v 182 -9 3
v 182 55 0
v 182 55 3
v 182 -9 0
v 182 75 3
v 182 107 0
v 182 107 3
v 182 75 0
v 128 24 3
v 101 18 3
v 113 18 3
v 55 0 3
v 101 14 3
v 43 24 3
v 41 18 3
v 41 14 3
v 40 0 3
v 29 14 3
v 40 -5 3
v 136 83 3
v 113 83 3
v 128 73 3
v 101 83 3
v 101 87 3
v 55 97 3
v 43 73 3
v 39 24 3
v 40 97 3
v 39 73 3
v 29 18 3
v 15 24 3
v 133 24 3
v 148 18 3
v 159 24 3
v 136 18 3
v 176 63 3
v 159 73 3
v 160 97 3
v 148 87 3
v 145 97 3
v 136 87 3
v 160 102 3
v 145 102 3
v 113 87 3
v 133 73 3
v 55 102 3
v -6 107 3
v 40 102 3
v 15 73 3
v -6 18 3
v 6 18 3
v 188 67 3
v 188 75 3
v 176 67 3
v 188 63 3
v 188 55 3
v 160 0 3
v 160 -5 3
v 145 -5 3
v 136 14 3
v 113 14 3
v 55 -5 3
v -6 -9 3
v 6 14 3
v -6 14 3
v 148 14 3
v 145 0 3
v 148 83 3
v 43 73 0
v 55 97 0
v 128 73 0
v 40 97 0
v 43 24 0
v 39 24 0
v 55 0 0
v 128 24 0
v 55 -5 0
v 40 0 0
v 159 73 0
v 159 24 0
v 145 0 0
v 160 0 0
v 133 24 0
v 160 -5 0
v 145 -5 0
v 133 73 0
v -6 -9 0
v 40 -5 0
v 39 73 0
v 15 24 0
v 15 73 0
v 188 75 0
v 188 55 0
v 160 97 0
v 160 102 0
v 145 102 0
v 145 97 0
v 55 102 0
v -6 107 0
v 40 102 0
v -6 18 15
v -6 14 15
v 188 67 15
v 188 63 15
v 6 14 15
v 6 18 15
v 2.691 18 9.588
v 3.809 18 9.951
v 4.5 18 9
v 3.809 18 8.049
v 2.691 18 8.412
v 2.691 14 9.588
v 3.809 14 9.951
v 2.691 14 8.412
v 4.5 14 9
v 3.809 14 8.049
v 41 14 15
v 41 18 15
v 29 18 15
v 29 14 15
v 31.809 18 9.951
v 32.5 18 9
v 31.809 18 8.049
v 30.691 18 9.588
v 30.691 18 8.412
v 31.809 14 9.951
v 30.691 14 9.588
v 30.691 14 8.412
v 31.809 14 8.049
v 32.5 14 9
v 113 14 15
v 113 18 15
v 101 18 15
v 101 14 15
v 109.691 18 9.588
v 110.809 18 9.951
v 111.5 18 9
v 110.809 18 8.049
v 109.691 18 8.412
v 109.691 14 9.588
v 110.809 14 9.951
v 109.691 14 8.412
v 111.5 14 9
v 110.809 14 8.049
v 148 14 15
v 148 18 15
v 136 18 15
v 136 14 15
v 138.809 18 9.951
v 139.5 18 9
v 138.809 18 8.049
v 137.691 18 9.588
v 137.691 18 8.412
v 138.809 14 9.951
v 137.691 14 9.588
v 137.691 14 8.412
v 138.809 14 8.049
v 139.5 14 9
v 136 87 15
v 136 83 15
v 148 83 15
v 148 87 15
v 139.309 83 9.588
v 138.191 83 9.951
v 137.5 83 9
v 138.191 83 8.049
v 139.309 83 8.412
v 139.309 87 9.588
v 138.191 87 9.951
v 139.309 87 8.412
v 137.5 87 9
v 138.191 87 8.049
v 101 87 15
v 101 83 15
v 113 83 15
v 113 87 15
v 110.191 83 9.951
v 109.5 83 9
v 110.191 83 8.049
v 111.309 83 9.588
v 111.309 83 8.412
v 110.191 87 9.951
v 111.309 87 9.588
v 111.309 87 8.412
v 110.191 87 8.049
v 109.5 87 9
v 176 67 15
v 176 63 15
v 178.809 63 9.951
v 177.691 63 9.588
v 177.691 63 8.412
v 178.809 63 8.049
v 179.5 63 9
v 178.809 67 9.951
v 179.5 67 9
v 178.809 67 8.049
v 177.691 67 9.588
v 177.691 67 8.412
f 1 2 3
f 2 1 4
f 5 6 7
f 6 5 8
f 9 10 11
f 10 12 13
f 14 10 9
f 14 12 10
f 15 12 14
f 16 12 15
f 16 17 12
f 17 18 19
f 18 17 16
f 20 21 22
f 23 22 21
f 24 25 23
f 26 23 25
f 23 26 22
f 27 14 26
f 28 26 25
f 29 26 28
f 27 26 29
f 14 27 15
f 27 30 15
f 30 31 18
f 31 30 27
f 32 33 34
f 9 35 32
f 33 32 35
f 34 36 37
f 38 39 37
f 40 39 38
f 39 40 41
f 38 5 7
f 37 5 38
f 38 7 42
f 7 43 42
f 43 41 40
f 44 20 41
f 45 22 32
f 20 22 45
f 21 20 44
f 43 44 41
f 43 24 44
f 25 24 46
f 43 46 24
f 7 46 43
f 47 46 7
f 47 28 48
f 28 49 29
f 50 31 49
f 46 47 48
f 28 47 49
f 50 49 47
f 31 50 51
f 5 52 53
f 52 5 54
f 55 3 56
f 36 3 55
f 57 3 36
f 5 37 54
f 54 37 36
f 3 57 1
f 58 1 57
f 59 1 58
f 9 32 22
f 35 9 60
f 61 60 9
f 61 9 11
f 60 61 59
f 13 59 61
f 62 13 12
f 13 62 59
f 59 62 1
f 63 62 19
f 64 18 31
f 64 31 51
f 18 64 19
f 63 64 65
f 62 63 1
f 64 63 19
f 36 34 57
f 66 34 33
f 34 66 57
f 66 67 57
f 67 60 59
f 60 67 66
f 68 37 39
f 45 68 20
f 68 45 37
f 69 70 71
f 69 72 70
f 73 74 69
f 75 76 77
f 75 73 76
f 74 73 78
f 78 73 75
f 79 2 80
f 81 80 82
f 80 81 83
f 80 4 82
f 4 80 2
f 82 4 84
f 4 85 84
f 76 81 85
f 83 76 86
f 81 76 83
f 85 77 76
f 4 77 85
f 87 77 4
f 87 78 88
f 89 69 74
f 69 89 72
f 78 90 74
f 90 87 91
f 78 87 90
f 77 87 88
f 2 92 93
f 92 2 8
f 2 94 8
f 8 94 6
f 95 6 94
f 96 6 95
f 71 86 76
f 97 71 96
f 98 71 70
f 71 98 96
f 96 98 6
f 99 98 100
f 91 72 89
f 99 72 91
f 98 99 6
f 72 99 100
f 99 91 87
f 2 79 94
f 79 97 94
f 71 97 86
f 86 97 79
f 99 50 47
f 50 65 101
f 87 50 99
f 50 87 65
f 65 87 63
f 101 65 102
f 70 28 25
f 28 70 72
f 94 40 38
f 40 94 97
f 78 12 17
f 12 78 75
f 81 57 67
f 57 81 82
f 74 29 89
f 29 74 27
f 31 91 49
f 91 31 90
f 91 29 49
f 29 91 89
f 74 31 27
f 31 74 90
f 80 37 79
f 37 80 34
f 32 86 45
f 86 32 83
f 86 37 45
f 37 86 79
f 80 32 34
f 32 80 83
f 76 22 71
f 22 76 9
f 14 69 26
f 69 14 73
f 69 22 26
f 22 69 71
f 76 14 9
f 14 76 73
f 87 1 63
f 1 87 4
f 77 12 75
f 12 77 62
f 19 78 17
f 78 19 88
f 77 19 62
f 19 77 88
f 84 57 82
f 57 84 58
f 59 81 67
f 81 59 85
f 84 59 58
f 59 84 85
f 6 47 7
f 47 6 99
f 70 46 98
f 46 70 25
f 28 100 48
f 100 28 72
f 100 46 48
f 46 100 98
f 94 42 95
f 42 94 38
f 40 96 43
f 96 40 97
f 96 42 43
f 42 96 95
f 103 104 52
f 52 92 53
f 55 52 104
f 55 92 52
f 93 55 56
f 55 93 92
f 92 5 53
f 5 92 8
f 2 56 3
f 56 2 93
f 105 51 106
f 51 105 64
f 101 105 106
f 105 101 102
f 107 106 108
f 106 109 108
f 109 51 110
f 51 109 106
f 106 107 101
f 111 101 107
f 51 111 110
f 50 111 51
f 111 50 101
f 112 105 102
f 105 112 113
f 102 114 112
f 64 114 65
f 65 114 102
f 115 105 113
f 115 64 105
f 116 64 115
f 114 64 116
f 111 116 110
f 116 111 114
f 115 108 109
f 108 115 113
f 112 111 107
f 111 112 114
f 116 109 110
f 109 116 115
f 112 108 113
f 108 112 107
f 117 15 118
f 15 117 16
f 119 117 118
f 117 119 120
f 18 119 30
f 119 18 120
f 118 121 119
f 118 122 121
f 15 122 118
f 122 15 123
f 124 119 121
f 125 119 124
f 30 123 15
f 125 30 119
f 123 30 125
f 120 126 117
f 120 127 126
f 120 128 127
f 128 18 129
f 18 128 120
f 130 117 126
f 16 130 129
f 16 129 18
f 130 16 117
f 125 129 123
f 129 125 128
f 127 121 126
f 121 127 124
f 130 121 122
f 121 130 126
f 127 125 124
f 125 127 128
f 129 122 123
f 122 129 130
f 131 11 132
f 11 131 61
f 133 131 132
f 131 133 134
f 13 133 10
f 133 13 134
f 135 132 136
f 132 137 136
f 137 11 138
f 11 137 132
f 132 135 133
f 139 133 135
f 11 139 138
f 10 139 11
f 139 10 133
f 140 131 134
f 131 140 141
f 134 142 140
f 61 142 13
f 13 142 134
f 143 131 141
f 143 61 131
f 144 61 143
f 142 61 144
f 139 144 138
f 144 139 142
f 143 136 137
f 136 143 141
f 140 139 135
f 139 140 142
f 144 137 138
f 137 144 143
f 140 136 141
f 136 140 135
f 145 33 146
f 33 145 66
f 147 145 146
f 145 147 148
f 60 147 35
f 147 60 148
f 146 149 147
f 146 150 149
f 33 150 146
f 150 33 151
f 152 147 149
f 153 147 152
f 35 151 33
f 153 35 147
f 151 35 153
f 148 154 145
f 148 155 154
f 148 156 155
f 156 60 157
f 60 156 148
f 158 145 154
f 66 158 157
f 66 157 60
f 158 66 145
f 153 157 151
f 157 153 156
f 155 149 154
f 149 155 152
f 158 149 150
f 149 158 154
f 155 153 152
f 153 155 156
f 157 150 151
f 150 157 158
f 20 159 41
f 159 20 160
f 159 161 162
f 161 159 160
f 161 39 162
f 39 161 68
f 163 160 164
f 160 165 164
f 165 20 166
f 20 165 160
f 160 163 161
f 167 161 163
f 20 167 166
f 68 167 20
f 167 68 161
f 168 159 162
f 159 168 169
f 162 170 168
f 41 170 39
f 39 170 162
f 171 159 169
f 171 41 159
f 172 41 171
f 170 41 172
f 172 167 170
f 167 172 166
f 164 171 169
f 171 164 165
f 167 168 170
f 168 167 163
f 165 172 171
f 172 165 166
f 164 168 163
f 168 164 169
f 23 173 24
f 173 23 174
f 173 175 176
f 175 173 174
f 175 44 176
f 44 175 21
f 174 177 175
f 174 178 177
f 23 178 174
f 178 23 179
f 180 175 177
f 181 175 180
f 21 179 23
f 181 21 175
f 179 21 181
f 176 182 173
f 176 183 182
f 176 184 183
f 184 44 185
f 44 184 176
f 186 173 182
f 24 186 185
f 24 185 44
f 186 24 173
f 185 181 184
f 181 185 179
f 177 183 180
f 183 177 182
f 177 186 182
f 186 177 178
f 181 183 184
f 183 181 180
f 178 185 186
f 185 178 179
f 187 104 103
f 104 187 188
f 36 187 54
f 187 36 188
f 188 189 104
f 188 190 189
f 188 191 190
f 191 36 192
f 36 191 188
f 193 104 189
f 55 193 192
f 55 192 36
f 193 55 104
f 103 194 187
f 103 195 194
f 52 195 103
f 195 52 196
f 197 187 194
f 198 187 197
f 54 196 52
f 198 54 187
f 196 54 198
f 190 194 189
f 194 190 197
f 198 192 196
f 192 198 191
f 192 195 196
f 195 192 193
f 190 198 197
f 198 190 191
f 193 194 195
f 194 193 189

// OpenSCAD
body_width = 173;
body_height = 97;
body_thickness = 0;//17;

servo_width = 23;
servo_height = 22;
servo_thickness = 12;

holder_thickness = 3;


module button() {
    translate([0, 0, body_thickness]) {
        cube([20, 13, 2]);
    }
}


module climatix_body() {
    //translate([0, 0, -body_thickness]) {
    cube([body_width, body_height, body_thickness]);

    translate([17, 27, 0]) {button();}
    translate([17, 42, 0]) {button();}
    translate([17, 57, 0]) {button();}

    translate([body_width - 17 - 20, 27, 0]) {button();}
    translate([body_width - 17 - 20, 42, 0]) {button();}
    translate([body_width - 17 - 20, 57, 0]) {button();}
}


module rod() {
    w = 21;
    h = 4;

    hull() {
        cylinder(h=2,r=4); 
        translate([15, 0, 0]) { cylinder(h=2, r=2); }
    }
    cylinder(h=4,r=4); 
}


module servo(rod_angle=180, enable_servo_body=true, left_holder=true, right_holder=true) {
    if ( enable_servo_body ) {
        cube([servo_width, servo_height, servo_thickness]); // servo main body
        difference() { // holding plate
            translate([-5, 18, 0]) { cube([32, 3, servo_thickness]); }
            translate([-2.5, 22, servo_thickness / 2]) { rotate([90, 0, 0]) { cylinder(h=10, r=1); } }
            translate([servo_width + 2.5, 22, servo_thickness / 2]) { rotate([90, 0, 0]) { cylinder(h=10, r=1); } }
        }

        // gearbox and axle
        translate([servo_thickness / 2, 0, servo_thickness / 2]) { rotate([-90, 0, 0]) { cylinder(h=servo_height + 6, r = servo_thickness / 2); } }
        translate([servo_thickness, 0, servo_thickness / 2]) { rotate([-90, 0, 0]) { cylinder(h=servo_height + 6, r = 2.5); } }
        translate([servo_thickness / 2, 0, servo_thickness / 2]) { rotate([-90, 0, 0]) { cylinder(h=servo_height + 10, r = 2.5); } }

        translate([servo_thickness / 2, 30 + 4, servo_thickness / 2]) { rotate([90, rod_angle, 0]) { rod(); } }
    }

    if ( left_holder ) {
        servo_holder_left();
    }
    if ( right_holder ) {
        servo_holder_right();
    }
}


module main_plate_holder() {
    union() {
        difference() {
            translate([-6, 0, body_thickness]) { cube([body_width + 15, body_height, holder_thickness]); }
            translate([15, 24, 0]) { cube([20 + 4, 13 * 3 + 2 * 2 + 6, 60]); }
            translate([body_width - 17 - 20 - 3, 24, 0]) { cube([20 + 6, 13 * 3 + 2 * 2 + 6, 60]); }
            translate([17 + 20 + 6, 24, 0]) { cube([85, 49, 60]); }
        }
        
        // extended piece to support right middle servo
        translate([body_width, 55, body_thickness]) { cube([15, 20, holder_thickness]); }

        difference() {
            translate([-6, -10 + 1, body_thickness]) { cube([body_width + 15, 10 + 1, holder_thickness]); }
            translate([40, -5, 0]) { cube([15, 5, 40]); }
            translate([145, -5, 0]) { cube([15, 5, 40]); }
        }
        difference() {
            translate([-6, body_height - 1, body_thickness]) { cube([body_width + 15, 10 + 1, holder_thickness]); }
            translate([40, body_height, 0]) { cube([15, 5, 40]); }
            translate([145, body_height, 0]) { cube([15, 5, 40]); }
        }

    }

    // holders for 3D printer
    //translate([-5, -5, body_thickness]) { cylinder(r=10, h=3); }
    //translate([body_width + 5, -5, body_thickness]) { cylinder(r=10, h=3); }
    //translate([-5, body_height + 5, body_thickness]) { cylinder(r=10, h=3); }
    //translate([body_width + 5, body_height + 5, body_thickness]) { cylinder(r=10, h=3); }

}


module servo_holder_left() {
    servo_holder_height = 4;
    difference() {
        translate([-12, 18 - servo_holder_height, 0]) { cube([12, servo_holder_height, servo_thickness]); }
        translate([-2.5, 22, servo_thickness / 2]) { rotate([90, 0, 0]) { cylinder(h=10, r=1); } }
    }
}


module servo_holder_right() {
    servo_holder_height = 4;
    difference() {
        translate([servo_width, 18 - servo_holder_height, 0]) { cube([12, servo_holder_height, servo_thickness]); }
        translate([servo_width + 2.5, 22, servo_thickness / 2]) { rotate([90, 0, 0]) { cylinder(h=10, r=1); } }
    }
}


enable_vitamins = false;
enable_servos = false;

if ( enable_vitamins ) {
    climatix_body();
}

main_plate_holder();


// bottom left
translate([6, 0, holder_thickness + body_thickness]) {
  rotate([0, 0, 0]) { servo(25, enable_servos); }
}

// bottom right
//translate([body_width - 37, 0, holder_thickness + body_thickness + servo_thickness]) {
//  rotate([0, 180, 0]) { servo(205, enable_servos); }
//}
translate([body_width - 37 - servo_width, 0, holder_thickness + body_thickness]) {
  rotate([0, 0, 0]) { servo(25, enable_servos); }
}

// top right
translate([body_width - 37, body_height + 4, holder_thickness + body_thickness]) {
  rotate([180, 180, 0]) { servo(155, enable_servos); }
}

// middle right
translate([153, 81, holder_thickness + body_thickness + servo_thickness]) {
  rotate([180, 0, 0]) { servo(205, enable_servos, false, true); }
}
